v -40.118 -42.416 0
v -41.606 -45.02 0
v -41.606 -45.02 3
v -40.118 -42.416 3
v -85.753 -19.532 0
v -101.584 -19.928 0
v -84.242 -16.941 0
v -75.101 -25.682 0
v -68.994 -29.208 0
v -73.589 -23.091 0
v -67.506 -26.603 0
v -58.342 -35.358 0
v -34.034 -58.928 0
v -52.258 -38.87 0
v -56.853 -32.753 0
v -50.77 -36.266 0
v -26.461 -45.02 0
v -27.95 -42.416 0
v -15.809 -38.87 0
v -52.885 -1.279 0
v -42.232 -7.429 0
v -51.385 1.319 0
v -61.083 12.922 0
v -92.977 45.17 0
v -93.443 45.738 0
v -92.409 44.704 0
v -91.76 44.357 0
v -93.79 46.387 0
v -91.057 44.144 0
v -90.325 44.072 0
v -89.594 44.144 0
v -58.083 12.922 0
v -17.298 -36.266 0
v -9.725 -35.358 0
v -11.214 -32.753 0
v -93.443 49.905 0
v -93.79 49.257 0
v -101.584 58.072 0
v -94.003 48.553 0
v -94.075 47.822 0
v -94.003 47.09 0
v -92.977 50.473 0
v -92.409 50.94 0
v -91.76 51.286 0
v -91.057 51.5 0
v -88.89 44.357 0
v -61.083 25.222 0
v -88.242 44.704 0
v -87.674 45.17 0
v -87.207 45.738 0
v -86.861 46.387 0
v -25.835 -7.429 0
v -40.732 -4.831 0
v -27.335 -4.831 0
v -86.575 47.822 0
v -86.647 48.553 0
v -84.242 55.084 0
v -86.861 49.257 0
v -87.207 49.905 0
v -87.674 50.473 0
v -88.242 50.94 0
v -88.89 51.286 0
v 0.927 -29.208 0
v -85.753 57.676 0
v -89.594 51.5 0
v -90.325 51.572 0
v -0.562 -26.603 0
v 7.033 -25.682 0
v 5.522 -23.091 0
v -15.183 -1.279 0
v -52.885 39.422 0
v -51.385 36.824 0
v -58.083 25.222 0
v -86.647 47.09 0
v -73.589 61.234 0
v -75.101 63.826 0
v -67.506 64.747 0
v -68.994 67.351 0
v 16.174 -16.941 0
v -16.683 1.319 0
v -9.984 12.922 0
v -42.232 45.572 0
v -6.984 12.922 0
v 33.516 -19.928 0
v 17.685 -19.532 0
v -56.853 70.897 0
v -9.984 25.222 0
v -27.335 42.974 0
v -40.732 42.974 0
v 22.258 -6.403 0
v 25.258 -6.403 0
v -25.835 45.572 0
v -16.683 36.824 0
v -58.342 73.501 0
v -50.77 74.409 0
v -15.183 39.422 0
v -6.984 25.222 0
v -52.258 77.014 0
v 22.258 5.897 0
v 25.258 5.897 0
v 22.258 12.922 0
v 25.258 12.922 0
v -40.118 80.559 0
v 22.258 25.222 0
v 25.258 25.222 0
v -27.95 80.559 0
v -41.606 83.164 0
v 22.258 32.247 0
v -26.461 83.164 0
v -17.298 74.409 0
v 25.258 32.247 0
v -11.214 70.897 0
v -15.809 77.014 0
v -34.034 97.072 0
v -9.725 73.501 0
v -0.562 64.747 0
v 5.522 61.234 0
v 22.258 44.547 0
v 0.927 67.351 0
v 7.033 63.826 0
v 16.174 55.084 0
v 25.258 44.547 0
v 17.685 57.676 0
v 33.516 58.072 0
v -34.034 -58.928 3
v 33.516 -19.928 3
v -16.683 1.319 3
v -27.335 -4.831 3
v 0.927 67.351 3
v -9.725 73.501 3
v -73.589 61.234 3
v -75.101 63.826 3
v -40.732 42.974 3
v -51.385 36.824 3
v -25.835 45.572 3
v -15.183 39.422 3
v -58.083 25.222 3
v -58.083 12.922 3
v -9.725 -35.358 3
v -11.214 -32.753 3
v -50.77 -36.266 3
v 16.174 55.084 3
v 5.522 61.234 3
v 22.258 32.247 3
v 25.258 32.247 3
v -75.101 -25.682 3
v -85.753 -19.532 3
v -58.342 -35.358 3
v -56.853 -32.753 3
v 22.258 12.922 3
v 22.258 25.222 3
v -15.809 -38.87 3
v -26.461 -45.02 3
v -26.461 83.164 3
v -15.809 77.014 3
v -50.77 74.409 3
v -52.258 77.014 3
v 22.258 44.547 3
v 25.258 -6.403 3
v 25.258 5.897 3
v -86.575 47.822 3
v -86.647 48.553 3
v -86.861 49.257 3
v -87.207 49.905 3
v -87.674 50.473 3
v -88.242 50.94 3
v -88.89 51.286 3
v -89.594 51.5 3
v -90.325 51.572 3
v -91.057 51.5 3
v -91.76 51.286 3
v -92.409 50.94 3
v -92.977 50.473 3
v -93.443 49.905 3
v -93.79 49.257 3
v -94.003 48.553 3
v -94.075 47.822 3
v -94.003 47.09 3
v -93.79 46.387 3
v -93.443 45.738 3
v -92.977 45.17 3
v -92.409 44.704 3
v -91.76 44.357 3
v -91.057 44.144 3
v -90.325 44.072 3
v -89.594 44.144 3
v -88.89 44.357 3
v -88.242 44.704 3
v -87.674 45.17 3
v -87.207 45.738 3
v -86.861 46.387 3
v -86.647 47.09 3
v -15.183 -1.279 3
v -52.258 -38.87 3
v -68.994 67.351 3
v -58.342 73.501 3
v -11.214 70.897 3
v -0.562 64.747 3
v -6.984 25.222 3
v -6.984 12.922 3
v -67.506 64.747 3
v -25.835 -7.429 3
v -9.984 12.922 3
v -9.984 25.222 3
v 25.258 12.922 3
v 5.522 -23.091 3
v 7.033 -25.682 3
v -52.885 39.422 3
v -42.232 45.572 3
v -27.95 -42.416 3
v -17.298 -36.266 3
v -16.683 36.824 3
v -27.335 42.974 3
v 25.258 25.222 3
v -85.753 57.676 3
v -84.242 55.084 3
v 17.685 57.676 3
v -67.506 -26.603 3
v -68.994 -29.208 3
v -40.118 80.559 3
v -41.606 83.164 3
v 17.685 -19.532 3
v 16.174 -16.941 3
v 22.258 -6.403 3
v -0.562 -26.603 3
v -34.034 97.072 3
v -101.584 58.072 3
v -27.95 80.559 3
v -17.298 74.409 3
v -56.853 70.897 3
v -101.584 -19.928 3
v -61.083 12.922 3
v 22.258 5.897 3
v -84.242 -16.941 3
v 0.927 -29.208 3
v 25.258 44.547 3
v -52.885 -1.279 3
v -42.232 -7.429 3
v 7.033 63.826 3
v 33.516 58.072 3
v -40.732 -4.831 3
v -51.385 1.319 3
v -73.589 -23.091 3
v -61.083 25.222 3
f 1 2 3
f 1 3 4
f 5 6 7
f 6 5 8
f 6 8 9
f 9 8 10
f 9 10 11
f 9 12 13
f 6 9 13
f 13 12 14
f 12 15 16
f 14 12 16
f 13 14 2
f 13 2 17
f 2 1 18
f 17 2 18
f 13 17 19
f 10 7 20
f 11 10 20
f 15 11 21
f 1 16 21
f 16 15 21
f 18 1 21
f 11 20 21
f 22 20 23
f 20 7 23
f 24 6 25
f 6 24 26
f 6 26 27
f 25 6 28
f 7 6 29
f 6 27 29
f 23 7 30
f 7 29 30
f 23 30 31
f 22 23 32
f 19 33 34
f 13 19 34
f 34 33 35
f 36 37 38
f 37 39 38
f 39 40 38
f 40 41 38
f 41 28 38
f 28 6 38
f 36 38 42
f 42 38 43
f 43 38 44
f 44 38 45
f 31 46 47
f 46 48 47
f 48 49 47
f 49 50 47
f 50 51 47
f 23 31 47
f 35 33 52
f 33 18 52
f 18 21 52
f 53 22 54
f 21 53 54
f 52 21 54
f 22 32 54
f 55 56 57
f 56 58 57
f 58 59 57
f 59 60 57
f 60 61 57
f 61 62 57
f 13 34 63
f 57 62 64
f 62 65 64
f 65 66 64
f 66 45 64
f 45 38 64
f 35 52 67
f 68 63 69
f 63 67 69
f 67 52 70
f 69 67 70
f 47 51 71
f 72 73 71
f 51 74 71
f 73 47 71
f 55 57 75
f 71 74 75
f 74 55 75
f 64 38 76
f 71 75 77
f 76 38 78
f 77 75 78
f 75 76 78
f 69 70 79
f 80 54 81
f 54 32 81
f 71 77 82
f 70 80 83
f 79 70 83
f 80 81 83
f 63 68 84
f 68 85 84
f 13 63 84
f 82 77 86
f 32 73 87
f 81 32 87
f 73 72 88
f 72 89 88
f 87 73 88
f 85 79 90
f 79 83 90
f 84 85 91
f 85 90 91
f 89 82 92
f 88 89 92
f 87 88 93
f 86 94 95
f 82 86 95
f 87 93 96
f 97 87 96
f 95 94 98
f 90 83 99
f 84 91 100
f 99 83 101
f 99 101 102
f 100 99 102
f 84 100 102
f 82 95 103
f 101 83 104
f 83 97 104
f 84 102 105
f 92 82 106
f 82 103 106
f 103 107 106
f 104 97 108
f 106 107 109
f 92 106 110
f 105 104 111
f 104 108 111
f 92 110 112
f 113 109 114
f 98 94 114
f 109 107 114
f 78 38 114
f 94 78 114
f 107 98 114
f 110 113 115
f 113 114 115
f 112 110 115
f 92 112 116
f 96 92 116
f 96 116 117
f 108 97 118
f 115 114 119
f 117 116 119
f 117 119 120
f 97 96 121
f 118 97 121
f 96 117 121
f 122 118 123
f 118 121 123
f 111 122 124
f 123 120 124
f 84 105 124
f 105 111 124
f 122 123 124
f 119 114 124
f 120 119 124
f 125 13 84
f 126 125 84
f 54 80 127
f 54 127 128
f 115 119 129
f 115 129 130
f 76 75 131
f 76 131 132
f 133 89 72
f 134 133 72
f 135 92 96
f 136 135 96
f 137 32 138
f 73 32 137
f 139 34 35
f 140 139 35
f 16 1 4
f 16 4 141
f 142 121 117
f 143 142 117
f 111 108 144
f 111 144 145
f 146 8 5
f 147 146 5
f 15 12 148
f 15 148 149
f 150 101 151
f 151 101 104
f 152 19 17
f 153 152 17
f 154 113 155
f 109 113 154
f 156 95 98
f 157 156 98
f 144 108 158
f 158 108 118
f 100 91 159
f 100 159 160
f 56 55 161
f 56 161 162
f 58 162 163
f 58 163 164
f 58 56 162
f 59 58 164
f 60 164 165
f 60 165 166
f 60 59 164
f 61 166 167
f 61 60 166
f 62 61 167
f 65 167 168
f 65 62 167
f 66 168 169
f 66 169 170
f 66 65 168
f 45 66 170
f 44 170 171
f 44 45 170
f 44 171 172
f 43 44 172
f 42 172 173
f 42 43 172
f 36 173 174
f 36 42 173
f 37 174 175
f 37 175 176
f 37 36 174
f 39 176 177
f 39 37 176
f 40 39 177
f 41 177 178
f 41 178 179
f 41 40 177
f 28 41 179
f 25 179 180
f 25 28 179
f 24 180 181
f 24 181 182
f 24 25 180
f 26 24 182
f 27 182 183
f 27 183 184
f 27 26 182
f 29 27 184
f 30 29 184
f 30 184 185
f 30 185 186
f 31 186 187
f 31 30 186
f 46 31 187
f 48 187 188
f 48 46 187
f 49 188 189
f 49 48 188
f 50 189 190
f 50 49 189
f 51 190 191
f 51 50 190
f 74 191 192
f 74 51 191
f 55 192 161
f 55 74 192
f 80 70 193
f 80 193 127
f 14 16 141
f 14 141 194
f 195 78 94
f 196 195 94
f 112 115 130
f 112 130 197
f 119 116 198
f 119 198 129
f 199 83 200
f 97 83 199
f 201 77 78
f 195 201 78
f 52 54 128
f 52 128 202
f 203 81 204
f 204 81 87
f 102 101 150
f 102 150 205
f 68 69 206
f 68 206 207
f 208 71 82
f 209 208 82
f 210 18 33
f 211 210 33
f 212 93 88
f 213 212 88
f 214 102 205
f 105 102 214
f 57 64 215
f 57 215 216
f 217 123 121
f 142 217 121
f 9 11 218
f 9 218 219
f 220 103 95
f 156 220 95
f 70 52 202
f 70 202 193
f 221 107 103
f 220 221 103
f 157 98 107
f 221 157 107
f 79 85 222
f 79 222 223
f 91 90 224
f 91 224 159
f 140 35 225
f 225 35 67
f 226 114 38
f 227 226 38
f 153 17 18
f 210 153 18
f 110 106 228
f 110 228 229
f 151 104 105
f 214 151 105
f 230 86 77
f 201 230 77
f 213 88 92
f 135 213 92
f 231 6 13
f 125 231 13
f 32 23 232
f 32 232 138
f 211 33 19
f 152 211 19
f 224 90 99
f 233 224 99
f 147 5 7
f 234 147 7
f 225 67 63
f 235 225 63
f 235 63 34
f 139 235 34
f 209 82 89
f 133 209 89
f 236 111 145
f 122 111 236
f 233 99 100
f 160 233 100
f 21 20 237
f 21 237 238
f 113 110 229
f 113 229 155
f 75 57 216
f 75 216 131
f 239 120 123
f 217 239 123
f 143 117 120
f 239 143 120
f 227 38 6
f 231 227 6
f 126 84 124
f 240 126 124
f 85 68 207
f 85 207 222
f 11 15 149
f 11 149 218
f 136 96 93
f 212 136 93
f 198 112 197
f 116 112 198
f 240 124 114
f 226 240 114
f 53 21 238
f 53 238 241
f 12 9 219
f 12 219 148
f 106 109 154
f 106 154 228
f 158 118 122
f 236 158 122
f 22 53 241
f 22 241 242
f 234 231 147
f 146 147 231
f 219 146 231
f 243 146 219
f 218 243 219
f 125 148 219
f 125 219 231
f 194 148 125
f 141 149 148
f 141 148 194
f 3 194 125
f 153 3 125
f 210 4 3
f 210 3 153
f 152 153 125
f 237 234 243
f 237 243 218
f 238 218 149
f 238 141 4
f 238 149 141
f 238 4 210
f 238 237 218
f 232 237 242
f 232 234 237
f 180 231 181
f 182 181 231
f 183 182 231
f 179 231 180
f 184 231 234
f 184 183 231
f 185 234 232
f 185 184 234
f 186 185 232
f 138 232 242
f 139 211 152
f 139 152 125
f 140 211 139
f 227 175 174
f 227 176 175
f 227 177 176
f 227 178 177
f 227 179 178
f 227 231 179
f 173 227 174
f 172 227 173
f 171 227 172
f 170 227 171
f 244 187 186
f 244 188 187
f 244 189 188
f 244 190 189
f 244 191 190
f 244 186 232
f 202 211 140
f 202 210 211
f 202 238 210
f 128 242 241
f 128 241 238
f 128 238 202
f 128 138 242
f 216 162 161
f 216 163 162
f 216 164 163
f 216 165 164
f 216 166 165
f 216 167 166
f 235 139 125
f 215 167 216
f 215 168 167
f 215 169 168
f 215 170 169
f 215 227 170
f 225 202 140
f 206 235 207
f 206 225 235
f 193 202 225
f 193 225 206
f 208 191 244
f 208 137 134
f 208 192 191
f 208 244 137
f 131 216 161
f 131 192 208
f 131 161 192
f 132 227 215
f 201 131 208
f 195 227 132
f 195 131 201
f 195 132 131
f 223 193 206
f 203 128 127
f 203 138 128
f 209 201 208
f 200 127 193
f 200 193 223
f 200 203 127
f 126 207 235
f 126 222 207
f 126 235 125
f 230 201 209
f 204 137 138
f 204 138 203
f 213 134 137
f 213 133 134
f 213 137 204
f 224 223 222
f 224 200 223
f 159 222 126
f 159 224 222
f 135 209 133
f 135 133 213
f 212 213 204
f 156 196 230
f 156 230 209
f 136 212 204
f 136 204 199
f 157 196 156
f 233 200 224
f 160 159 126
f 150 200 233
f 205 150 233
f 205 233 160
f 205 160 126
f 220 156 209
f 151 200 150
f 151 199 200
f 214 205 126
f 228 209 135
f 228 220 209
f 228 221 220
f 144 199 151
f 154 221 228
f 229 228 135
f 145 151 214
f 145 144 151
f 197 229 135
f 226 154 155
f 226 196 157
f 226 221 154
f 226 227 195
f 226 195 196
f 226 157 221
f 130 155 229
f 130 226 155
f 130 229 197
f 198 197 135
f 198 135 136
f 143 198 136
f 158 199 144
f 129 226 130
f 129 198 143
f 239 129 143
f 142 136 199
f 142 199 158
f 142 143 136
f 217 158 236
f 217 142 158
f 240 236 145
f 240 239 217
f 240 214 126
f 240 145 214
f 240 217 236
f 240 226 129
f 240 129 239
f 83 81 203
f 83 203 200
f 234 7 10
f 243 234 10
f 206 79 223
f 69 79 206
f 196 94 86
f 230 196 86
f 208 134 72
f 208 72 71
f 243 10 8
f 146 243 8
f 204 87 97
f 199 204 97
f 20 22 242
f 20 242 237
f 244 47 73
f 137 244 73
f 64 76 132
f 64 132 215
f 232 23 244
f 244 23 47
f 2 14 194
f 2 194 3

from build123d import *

# Parameters (mm, degrees)
CROQUIS1_R              = 3.75
CROQUIS1_W              = 3
CROQUIS1_H              = 12.3
SALIENTE_EXTRUIR1_DEPTH = 3


with BuildPart() as part:
    # Croquis1 → Saliente-Extruir1 (new body)
    with BuildSketch(Plane.XY):
        Polygon((-34.033695548, 97.071783877), (-101.583677043, 58.071783877), (-101.583677043, -19.928216123), (-34.033695548, -58.928216123), (33.516285947, -19.928216123), (33.516285947, 58.071783877), align=None)
        with Locations((-90.325346794, 47.821783877)):
            Circle(CROQUIS1_R, mode=Mode.SUBTRACT)
        Polygon((-51.384514513, 1.319283877), (-52.884514513, -1.278792335), (-42.232402047, -7.428792335), (-40.732402047, -4.830716123), align=None, mode=Mode.SUBTRACT)
        Polygon((-26.461178531, 83.163890705), (-27.949867087, 80.559283877), (-17.297738084, 74.409274329), (-15.809049529, 77.013881158), align=None, mode=Mode.SUBTRACT)
        Polygon((7.033309637, 63.825838945), (17.685438639, 57.675829398), (16.174127236, 55.084283877), (5.521998234, 61.234293424), align=None, mode=Mode.SUBTRACT)
        Polygon((5.521998234, -23.090725671), (7.033309637, -25.682271192), (17.685438639, -19.532261645), (16.174127236, -16.940716123), align=None, mode=Mode.SUBTRACT)
        Polygon((-9.725254139, 73.501400252), (-11.213942694, 70.896793424), (-0.561813692, 64.746783877), (0.926874864, 67.351390705), align=None, mode=Mode.SUBTRACT)
        Polygon((0.926874864, -29.207822952), (-9.725254139, -35.357832499), (-11.213942694, -32.753225671), (-0.561813692, -26.603216123), align=None, mode=Mode.SUBTRACT)
        Polygon((-15.809049529, -38.870313405), (-26.461178531, -45.020322952), (-27.949867087, -42.415716123), (-17.297738084, -36.265706576), align=None, mode=Mode.SUBTRACT)
        Polygon((-50.769653012, -36.265706576), (-52.258341568, -38.870313405), (-41.606212565, -45.020322952), (-40.11752401, -42.415716123), align=None, mode=Mode.SUBTRACT)
        Polygon((-67.505577405, -26.603216123), (-68.99426596, -29.207822952), (-58.342136958, -35.357832499), (-56.853448402, -32.753225671), align=None, mode=Mode.SUBTRACT)
        Polygon((-84.241518333, -16.940716123), (-73.58938933, -23.090725671), (-75.100700733, -25.682271192), (-85.752829736, -19.532261645), align=None, mode=Mode.SUBTRACT)
        Polygon((-73.58938933, 61.234293424), (-75.100700733, 63.825838945), (-85.752829736, 57.675829398), (-84.241518333, 55.084283877), align=None, mode=Mode.SUBTRACT)
        Polygon((-68.99426596, 67.351390705), (-58.342136958, 73.501400252), (-56.853448402, 70.896793424), (-67.505577405, 64.746783877), align=None, mode=Mode.SUBTRACT)
        Polygon((-52.258341568, 77.013881158), (-41.606212565, 83.163890705), (-40.11752401, 80.559283877), (-50.769653012, 74.409274329), align=None, mode=Mode.SUBTRACT)
        with Locations((23.757955698, 38.396783877)):
            Rectangle(CROQUIS1_W, CROQUIS1_H, mode=Mode.SUBTRACT)
        with Locations((23.757955698, 19.071783877)):
            Rectangle(CROQUIS1_W, CROQUIS1_H, mode=Mode.SUBTRACT)
        with Locations((23.757955698, -0.253216123)):
            Rectangle(CROQUIS1_W, CROQUIS1_H, mode=Mode.SUBTRACT)
        Polygon((-25.83498905, 45.572360088), (-15.182876583, 39.422360088), (-16.682876583, 36.824283877), (-27.33498905, 42.974283877), align=None, mode=Mode.SUBTRACT)
        Polygon((-52.884514513, 39.422360088), (-42.232402047, 45.572360088), (-40.732402047, 42.974283877), (-51.384514513, 36.824283877), align=None, mode=Mode.SUBTRACT)
        Polygon((-27.33498905, -4.830716123), (-25.83498905, -7.428792335), (-15.182876583, -1.278792335), (-16.682876583, 1.319283877), align=None, mode=Mode.SUBTRACT)
        with Locations((-8.484170085, 19.071783877)):
            Rectangle(CROQUIS1_W, CROQUIS1_H, mode=Mode.SUBTRACT)
        with Locations((-59.583221011, 19.071783877)):
            Rectangle(CROQUIS1_W, CROQUIS1_H, mode=Mode.SUBTRACT)
    extrude(amount=SALIENTE_EXTRUIR1_DEPTH)


solid = part.part
